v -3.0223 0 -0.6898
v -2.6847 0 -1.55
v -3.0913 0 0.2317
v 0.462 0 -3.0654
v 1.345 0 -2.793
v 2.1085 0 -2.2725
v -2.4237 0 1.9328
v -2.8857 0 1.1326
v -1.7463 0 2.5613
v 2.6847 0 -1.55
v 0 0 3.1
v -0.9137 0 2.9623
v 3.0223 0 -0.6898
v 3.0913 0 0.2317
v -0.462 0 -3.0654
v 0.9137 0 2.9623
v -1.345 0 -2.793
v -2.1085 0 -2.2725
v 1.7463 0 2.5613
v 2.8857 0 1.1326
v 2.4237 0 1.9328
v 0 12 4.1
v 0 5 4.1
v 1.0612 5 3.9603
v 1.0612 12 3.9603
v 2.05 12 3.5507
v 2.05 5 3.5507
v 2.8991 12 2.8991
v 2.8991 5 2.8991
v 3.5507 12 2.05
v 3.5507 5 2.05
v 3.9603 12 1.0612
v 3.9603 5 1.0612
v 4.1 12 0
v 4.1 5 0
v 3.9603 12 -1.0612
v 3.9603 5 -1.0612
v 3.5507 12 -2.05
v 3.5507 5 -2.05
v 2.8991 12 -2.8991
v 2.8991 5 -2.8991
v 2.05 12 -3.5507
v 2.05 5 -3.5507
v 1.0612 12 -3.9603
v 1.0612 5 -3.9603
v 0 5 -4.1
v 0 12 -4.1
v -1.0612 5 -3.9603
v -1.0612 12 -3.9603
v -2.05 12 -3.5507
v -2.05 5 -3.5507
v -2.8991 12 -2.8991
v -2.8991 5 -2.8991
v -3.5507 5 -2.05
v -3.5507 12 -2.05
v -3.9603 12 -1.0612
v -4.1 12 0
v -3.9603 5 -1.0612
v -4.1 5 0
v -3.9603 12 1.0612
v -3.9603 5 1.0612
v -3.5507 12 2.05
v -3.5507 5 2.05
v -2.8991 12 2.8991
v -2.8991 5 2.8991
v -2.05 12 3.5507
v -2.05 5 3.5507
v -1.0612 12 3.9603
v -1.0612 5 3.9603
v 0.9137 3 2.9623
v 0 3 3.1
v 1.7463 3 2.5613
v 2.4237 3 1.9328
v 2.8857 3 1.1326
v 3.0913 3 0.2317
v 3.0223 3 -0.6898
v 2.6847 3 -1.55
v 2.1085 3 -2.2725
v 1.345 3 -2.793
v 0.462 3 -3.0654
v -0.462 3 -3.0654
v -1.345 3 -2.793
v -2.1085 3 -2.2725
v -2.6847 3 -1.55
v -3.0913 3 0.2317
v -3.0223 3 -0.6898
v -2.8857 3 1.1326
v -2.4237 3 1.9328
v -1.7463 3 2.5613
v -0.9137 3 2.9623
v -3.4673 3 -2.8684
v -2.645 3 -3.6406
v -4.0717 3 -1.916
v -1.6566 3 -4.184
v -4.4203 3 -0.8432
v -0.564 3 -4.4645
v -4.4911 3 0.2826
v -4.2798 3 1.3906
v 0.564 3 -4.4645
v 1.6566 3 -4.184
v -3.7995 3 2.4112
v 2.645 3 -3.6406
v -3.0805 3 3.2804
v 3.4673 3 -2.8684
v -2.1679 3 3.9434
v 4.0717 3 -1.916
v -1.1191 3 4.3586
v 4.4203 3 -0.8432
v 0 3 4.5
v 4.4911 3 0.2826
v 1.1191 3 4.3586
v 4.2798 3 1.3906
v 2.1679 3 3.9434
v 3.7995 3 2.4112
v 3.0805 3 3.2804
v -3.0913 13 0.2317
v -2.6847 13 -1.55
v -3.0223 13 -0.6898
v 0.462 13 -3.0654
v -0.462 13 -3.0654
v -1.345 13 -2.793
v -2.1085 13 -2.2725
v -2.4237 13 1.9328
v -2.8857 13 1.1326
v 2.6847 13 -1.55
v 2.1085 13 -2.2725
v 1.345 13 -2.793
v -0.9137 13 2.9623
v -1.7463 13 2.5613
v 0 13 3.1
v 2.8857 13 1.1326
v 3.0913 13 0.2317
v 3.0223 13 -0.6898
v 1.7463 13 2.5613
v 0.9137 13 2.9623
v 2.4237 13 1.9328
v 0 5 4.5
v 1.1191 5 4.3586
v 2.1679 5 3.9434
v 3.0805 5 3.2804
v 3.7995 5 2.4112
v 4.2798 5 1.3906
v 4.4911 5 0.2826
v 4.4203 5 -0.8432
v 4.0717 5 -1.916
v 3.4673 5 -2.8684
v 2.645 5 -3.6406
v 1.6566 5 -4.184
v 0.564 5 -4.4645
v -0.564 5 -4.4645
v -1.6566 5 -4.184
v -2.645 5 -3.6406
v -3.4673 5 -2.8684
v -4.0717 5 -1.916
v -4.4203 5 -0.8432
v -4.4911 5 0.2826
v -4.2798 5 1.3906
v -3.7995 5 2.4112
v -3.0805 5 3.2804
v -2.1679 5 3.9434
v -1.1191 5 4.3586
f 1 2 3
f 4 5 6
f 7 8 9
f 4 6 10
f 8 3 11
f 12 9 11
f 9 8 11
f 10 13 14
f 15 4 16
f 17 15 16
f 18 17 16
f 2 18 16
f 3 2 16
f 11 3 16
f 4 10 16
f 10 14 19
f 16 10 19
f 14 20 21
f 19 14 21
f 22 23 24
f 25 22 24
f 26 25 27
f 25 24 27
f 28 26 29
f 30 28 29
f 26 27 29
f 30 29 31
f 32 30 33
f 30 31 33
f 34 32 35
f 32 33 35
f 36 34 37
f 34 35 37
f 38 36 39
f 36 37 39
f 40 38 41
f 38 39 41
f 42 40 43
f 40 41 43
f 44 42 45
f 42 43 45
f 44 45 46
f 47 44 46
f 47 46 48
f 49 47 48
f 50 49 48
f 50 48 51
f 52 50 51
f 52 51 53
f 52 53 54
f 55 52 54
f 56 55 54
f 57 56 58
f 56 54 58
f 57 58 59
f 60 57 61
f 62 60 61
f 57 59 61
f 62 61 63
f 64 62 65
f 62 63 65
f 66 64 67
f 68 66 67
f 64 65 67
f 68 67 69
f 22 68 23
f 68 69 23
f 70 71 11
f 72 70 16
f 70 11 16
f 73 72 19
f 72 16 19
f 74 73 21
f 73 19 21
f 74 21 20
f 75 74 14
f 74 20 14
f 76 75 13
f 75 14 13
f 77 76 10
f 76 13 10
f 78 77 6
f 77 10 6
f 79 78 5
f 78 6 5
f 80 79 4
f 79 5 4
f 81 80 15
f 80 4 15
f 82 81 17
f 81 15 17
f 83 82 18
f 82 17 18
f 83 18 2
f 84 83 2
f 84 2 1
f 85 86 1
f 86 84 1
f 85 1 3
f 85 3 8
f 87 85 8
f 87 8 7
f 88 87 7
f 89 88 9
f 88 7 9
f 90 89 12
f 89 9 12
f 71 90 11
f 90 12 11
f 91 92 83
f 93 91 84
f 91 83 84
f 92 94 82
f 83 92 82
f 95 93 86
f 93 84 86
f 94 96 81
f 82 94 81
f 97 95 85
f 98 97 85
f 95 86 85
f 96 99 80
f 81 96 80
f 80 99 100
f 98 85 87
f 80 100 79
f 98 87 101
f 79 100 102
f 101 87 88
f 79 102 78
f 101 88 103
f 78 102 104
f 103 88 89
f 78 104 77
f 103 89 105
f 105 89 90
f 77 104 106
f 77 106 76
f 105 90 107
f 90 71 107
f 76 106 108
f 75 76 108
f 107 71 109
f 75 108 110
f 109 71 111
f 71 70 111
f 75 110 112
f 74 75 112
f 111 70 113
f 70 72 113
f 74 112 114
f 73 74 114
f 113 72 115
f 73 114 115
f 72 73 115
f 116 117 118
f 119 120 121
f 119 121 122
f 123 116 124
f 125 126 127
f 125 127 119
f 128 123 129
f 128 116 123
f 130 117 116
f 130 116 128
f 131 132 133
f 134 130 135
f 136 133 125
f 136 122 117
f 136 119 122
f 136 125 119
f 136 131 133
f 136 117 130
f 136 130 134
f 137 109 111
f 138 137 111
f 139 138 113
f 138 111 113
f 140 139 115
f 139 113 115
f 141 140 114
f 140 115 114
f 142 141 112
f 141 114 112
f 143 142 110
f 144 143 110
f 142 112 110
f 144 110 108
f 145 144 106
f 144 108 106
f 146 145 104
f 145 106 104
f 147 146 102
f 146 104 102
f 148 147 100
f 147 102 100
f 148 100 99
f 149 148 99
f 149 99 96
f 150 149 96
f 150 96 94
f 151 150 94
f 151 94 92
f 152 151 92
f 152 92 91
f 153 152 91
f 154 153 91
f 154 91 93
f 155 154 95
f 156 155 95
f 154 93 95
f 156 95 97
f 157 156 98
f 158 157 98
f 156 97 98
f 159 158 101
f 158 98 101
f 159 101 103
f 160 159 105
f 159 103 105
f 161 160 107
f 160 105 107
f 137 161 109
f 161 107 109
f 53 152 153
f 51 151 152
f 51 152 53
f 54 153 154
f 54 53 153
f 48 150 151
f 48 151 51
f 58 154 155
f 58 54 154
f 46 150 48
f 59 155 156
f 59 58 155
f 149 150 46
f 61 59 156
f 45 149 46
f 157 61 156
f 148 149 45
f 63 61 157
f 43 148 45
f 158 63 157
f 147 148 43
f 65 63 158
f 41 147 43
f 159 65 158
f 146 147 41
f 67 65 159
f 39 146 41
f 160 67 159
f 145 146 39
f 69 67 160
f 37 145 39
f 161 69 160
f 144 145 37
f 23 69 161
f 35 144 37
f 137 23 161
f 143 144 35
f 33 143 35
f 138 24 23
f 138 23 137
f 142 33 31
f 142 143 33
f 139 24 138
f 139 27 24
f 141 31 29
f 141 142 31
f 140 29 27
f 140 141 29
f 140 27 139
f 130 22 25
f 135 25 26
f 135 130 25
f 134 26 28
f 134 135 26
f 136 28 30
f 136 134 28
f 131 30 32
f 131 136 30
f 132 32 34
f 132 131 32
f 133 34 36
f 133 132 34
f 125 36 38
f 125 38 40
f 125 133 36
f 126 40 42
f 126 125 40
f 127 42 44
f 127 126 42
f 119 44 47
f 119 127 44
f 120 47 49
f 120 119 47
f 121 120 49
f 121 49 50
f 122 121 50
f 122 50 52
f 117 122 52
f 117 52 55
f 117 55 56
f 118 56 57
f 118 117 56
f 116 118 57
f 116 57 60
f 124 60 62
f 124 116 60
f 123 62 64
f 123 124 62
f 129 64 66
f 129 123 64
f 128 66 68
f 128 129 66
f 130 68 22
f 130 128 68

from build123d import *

# Parameters (mm, degrees)
SKETCH1_R           = 3.1
BOSS_EXTRUDE1_DEPTH = 5
SKETCH2_R           = 4.5
BOSS_EXTRUDE2_DEPTH = 2
SKETCH3_R           = 4.1
BOSS_EXTRUDE3_DEPTH = 8
CHAMFER1_SIZE       = 1


with BuildPart() as part:
    # Sketch1 → Boss-Extrude1 (new body)
    with BuildSketch(Plane(origin=(0, 0, 0), x_dir=(1, 0, 0), z_dir=(0, 1, 0))):
        with Locations(Location((0, 0, 0), (0, 0, 270))):
            Circle(SKETCH1_R)
    extrude(amount=BOSS_EXTRUDE1_DEPTH)

    # Sketch2 → Boss-Extrude2 (add)
    with BuildSketch(Plane(origin=(0, 3, 0), x_dir=(1, 0, 0), z_dir=(0, 1, 0))):
        with Locations(Location((0, 0, 0), (0, 0, 270))):
            Circle(SKETCH2_R)
    extrude(amount=BOSS_EXTRUDE2_DEPTH)

    # Sketch3 → Boss-Extrude3 (add)
    with BuildSketch(Plane(origin=(0, 5, 0), x_dir=(1, 0, 0), z_dir=(0, 1, 0))):
        with Locations(Location((0, 0, 0), (0, 0, 270))):
            Circle(SKETCH3_R)
    extrude(amount=BOSS_EXTRUDE3_DEPTH)

    # Chamfer1
    chamfer1_edges = [part.edges().sort_by_distance(p)[0] for p in [
        (0, 13, -4.1),
    ]]
    chamfer(chamfer1_edges, length=CHAMFER1_SIZE)


solid = part.part
